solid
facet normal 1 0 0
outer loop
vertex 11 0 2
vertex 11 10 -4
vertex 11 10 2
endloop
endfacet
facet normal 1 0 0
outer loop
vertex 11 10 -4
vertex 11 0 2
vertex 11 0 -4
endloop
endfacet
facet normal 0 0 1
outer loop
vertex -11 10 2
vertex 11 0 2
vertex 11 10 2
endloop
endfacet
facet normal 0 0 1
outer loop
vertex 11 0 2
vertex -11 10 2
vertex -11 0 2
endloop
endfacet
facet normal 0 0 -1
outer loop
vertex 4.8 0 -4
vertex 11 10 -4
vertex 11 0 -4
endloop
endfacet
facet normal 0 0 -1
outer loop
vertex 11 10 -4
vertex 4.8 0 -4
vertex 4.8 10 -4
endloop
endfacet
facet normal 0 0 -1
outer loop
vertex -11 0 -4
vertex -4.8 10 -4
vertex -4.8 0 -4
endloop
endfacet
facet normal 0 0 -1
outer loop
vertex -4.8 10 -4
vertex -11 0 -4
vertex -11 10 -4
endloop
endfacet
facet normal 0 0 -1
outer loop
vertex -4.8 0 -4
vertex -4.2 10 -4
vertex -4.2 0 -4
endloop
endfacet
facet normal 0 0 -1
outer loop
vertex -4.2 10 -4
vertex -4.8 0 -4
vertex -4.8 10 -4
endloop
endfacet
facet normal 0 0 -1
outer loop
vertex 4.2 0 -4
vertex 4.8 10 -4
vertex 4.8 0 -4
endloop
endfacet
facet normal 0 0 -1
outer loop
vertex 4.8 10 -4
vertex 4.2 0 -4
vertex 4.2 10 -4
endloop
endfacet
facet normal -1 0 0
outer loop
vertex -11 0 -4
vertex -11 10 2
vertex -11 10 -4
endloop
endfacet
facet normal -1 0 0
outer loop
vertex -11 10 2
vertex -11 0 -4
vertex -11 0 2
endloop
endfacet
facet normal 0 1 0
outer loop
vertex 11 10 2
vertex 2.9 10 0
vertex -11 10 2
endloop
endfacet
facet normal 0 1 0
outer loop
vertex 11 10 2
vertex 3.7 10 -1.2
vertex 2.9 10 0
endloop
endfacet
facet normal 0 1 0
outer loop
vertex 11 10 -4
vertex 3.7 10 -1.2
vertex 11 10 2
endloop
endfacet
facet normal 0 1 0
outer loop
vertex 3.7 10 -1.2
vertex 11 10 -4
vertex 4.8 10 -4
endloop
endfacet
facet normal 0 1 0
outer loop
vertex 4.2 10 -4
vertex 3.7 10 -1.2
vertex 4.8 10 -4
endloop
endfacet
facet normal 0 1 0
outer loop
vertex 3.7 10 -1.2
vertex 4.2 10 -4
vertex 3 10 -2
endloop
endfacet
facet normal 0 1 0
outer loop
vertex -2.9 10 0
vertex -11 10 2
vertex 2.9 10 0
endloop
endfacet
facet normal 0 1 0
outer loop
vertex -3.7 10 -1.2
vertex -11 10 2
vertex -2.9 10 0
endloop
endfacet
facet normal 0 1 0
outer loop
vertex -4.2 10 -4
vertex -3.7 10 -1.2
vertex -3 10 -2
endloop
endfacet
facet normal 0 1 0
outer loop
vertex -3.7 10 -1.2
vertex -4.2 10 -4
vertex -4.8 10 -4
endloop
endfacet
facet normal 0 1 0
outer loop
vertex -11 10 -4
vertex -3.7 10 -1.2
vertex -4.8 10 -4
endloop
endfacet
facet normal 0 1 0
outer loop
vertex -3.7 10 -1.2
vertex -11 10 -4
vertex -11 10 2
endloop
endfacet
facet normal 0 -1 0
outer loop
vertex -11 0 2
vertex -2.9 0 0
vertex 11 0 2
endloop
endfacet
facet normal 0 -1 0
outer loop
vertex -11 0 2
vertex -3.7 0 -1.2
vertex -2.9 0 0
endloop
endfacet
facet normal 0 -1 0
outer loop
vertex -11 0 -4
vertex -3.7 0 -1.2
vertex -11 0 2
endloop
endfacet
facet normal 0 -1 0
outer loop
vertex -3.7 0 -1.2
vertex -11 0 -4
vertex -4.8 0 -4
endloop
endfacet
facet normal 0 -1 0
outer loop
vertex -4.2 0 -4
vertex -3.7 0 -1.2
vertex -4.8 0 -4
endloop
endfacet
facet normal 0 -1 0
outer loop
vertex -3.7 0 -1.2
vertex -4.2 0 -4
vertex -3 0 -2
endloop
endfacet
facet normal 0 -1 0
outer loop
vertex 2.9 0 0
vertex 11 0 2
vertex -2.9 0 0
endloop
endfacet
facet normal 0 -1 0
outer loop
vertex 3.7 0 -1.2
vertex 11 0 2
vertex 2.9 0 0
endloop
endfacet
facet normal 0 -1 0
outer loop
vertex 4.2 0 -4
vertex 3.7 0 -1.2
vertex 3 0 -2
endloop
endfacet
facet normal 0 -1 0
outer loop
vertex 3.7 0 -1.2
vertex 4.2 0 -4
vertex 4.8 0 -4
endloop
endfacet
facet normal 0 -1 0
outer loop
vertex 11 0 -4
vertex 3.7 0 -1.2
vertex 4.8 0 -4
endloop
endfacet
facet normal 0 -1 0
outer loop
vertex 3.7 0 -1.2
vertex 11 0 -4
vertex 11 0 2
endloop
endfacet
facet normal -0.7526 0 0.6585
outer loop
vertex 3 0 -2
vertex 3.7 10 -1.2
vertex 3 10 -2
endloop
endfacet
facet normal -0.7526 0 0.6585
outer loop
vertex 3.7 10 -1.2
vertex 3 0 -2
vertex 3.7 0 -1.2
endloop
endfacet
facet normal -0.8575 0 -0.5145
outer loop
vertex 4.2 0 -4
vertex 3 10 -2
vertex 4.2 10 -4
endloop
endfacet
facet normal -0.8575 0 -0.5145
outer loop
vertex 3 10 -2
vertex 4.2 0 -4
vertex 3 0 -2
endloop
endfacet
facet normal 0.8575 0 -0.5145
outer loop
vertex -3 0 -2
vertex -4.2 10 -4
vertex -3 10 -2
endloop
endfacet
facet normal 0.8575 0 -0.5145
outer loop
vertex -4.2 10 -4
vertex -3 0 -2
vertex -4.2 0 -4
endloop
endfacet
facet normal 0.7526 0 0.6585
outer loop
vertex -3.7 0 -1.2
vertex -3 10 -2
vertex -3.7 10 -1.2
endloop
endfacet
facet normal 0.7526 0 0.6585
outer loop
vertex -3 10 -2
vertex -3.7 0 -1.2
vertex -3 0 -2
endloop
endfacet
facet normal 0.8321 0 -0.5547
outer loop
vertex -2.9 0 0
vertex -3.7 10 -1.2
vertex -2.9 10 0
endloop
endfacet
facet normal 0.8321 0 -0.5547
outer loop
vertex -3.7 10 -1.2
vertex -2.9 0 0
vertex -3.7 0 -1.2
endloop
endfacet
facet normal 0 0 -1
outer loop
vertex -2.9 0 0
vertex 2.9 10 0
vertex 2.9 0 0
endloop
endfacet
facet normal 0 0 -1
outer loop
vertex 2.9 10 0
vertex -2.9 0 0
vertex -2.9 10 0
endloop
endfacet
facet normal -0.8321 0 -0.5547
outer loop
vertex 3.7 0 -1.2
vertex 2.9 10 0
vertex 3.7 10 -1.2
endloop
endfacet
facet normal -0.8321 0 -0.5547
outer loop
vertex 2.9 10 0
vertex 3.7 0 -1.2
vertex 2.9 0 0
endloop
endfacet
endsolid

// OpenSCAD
// Rozchod kolajnic pre dualVslotCover
rozchodKolajnic = 20;

module form(side_extension_width = 0, slot_form = false) {
    /* HIDDEN */
    side_add_w = side_extension_width;

    $fn = 1 * 60;

    top2_w = 1 * 9.6;
    top_w = 1 * 10; // 9.2 -v2> 9.6 -v3> 10
    w1 = 1 * 8.4;
    w2 = 1 * 6;
    w3 = 1 * 7.4; // 8 -v2> 7.4
    bottom_w = 1 * 5.8;

    h1 = 1 * 4; // 3.8 -v4> 4.0
    h2 = 1 * 2;
    h3 = 1 * 1.2;
    h_top_cover = 1 * 0.5;

    wall_thick = 1 * 0.8; //
    tb_thick = 1 * 0; // top-bottom thickness 0.8 -v3> 0.4 -v4> 0

    // MAIN

    difference() {
        polygon(points = [[- bottom_w / 2, 0],
                [- w3 / 2, h3],
                [- w2 / 2, h2],
                [- w1 / 2, h1],
                [- top2_w / 2, h1],
                [- top_w / 2, h1 + h_top_cover],
                [top_w / 2 + side_add_w, h1 + h_top_cover],
                [top2_w / 2 + side_add_w, h1],
                [w1 / 2, h1],
                [w2 / 2, h2],
                [w3 / 2, h3],
                [bottom_w / 2, 0]]);

        if (!slot_form) polygon(points = [[- bottom_w / 2 + wall_thick, tb_thick],
                [- w3 / 2 + wall_thick, h3],
                [- w2 / 2 + wall_thick, h2],
                [- w1 / 2 + wall_thick, h1],
                [w1 / 2 - wall_thick, h1],
                [w2 / 2 - wall_thick, h2],
                [w3 / 2 - wall_thick, h3],
                [bottom_w / 2 - wall_thick, tb_thick]]);
    }
}


module vslotCover(length, side_extension_width = 0) {
    rotate([- 90, 0, 0])
        linear_extrude(height = length) {
            form(side_extension_width = side_extension_width);
        }
}

module dualVslotCover(dlzka = 135) {
    vslotCover(dlzka, rozchodKolajnic);
    translate([rozchodKolajnic, 0, 0]) vslotCover(dlzka, 0);
    //    translate([0, 0, 0]) boxKlieste();
}

module vslot(length) {
    rotate([- 90, 0, 0])
        linear_extrude(height = length) {
            form(slot_form = true);
        }
}

module vslot_test() {
    difference() {
        translate([- 11, 0, - 4]) cube([22, 10, 6]);
        vslot(10);
    }
}

//dualVslotCover(40);

//vslotCover(50,20);
//translate([20, 0, 0]) vslotCover(10);
vslot_test();

//form(slot_form=true);
